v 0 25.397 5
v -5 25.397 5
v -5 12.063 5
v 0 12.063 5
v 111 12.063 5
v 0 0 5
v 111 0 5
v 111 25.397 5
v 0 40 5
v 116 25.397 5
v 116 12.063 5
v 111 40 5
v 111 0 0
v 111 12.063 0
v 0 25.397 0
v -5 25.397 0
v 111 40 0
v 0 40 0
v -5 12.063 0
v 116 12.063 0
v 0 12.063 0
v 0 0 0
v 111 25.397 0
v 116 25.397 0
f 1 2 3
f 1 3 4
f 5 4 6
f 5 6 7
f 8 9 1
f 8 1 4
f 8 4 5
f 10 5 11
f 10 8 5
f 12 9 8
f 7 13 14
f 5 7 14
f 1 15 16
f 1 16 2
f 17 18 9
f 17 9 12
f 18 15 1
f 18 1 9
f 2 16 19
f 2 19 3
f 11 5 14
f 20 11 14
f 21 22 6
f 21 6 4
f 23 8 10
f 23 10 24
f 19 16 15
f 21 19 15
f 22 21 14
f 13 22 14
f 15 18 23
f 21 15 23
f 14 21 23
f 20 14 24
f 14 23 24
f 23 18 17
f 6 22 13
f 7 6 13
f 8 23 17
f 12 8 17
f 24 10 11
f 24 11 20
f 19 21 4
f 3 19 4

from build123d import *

# Parameters (mm, degrees)
CROQUIS1_W              = 111
CROQUIS1_H              = 40
SALIENTE_EXTRUIR1_DEPTH = 5
CROQUIS2_W              = 5
CROQUIS2_H              = 13.333333333
SALIENTE_EXTRUIR2_DEPTH = 5
CROQUIS3_W              = 5
CROQUIS3_H              = 13.333333333
SALIENTE_EXTRUIR3_DEPTH = 5


with BuildPart() as part:
    # Croquis1 → Saliente-Extruir1 (new body)
    with BuildSketch(Plane.XY):
        with Locations((55.5, 20)):
            Rectangle(CROQUIS1_W, CROQUIS1_H)
    extrude(amount=SALIENTE_EXTRUIR1_DEPTH)

    # Croquis2 → Saliente-Extruir2 (add)
    with BuildSketch(Plane(origin=(111, 0, 0), x_dir=(0, 0, -1), z_dir=(1, 0, 0))):
        with Locations((-2.5, 18.729999967)):
            Rectangle(CROQUIS2_W, CROQUIS2_H)
    extrude(amount=SALIENTE_EXTRUIR2_DEPTH)

    # Croquis3 → Saliente-Extruir3 (add)
    with BuildSketch(Plane.ZY):
        with Locations((2.5, 18.729999967)):
            Rectangle(CROQUIS3_W, CROQUIS3_H)
    extrude(amount=SALIENTE_EXTRUIR3_DEPTH)


solid = part.part
